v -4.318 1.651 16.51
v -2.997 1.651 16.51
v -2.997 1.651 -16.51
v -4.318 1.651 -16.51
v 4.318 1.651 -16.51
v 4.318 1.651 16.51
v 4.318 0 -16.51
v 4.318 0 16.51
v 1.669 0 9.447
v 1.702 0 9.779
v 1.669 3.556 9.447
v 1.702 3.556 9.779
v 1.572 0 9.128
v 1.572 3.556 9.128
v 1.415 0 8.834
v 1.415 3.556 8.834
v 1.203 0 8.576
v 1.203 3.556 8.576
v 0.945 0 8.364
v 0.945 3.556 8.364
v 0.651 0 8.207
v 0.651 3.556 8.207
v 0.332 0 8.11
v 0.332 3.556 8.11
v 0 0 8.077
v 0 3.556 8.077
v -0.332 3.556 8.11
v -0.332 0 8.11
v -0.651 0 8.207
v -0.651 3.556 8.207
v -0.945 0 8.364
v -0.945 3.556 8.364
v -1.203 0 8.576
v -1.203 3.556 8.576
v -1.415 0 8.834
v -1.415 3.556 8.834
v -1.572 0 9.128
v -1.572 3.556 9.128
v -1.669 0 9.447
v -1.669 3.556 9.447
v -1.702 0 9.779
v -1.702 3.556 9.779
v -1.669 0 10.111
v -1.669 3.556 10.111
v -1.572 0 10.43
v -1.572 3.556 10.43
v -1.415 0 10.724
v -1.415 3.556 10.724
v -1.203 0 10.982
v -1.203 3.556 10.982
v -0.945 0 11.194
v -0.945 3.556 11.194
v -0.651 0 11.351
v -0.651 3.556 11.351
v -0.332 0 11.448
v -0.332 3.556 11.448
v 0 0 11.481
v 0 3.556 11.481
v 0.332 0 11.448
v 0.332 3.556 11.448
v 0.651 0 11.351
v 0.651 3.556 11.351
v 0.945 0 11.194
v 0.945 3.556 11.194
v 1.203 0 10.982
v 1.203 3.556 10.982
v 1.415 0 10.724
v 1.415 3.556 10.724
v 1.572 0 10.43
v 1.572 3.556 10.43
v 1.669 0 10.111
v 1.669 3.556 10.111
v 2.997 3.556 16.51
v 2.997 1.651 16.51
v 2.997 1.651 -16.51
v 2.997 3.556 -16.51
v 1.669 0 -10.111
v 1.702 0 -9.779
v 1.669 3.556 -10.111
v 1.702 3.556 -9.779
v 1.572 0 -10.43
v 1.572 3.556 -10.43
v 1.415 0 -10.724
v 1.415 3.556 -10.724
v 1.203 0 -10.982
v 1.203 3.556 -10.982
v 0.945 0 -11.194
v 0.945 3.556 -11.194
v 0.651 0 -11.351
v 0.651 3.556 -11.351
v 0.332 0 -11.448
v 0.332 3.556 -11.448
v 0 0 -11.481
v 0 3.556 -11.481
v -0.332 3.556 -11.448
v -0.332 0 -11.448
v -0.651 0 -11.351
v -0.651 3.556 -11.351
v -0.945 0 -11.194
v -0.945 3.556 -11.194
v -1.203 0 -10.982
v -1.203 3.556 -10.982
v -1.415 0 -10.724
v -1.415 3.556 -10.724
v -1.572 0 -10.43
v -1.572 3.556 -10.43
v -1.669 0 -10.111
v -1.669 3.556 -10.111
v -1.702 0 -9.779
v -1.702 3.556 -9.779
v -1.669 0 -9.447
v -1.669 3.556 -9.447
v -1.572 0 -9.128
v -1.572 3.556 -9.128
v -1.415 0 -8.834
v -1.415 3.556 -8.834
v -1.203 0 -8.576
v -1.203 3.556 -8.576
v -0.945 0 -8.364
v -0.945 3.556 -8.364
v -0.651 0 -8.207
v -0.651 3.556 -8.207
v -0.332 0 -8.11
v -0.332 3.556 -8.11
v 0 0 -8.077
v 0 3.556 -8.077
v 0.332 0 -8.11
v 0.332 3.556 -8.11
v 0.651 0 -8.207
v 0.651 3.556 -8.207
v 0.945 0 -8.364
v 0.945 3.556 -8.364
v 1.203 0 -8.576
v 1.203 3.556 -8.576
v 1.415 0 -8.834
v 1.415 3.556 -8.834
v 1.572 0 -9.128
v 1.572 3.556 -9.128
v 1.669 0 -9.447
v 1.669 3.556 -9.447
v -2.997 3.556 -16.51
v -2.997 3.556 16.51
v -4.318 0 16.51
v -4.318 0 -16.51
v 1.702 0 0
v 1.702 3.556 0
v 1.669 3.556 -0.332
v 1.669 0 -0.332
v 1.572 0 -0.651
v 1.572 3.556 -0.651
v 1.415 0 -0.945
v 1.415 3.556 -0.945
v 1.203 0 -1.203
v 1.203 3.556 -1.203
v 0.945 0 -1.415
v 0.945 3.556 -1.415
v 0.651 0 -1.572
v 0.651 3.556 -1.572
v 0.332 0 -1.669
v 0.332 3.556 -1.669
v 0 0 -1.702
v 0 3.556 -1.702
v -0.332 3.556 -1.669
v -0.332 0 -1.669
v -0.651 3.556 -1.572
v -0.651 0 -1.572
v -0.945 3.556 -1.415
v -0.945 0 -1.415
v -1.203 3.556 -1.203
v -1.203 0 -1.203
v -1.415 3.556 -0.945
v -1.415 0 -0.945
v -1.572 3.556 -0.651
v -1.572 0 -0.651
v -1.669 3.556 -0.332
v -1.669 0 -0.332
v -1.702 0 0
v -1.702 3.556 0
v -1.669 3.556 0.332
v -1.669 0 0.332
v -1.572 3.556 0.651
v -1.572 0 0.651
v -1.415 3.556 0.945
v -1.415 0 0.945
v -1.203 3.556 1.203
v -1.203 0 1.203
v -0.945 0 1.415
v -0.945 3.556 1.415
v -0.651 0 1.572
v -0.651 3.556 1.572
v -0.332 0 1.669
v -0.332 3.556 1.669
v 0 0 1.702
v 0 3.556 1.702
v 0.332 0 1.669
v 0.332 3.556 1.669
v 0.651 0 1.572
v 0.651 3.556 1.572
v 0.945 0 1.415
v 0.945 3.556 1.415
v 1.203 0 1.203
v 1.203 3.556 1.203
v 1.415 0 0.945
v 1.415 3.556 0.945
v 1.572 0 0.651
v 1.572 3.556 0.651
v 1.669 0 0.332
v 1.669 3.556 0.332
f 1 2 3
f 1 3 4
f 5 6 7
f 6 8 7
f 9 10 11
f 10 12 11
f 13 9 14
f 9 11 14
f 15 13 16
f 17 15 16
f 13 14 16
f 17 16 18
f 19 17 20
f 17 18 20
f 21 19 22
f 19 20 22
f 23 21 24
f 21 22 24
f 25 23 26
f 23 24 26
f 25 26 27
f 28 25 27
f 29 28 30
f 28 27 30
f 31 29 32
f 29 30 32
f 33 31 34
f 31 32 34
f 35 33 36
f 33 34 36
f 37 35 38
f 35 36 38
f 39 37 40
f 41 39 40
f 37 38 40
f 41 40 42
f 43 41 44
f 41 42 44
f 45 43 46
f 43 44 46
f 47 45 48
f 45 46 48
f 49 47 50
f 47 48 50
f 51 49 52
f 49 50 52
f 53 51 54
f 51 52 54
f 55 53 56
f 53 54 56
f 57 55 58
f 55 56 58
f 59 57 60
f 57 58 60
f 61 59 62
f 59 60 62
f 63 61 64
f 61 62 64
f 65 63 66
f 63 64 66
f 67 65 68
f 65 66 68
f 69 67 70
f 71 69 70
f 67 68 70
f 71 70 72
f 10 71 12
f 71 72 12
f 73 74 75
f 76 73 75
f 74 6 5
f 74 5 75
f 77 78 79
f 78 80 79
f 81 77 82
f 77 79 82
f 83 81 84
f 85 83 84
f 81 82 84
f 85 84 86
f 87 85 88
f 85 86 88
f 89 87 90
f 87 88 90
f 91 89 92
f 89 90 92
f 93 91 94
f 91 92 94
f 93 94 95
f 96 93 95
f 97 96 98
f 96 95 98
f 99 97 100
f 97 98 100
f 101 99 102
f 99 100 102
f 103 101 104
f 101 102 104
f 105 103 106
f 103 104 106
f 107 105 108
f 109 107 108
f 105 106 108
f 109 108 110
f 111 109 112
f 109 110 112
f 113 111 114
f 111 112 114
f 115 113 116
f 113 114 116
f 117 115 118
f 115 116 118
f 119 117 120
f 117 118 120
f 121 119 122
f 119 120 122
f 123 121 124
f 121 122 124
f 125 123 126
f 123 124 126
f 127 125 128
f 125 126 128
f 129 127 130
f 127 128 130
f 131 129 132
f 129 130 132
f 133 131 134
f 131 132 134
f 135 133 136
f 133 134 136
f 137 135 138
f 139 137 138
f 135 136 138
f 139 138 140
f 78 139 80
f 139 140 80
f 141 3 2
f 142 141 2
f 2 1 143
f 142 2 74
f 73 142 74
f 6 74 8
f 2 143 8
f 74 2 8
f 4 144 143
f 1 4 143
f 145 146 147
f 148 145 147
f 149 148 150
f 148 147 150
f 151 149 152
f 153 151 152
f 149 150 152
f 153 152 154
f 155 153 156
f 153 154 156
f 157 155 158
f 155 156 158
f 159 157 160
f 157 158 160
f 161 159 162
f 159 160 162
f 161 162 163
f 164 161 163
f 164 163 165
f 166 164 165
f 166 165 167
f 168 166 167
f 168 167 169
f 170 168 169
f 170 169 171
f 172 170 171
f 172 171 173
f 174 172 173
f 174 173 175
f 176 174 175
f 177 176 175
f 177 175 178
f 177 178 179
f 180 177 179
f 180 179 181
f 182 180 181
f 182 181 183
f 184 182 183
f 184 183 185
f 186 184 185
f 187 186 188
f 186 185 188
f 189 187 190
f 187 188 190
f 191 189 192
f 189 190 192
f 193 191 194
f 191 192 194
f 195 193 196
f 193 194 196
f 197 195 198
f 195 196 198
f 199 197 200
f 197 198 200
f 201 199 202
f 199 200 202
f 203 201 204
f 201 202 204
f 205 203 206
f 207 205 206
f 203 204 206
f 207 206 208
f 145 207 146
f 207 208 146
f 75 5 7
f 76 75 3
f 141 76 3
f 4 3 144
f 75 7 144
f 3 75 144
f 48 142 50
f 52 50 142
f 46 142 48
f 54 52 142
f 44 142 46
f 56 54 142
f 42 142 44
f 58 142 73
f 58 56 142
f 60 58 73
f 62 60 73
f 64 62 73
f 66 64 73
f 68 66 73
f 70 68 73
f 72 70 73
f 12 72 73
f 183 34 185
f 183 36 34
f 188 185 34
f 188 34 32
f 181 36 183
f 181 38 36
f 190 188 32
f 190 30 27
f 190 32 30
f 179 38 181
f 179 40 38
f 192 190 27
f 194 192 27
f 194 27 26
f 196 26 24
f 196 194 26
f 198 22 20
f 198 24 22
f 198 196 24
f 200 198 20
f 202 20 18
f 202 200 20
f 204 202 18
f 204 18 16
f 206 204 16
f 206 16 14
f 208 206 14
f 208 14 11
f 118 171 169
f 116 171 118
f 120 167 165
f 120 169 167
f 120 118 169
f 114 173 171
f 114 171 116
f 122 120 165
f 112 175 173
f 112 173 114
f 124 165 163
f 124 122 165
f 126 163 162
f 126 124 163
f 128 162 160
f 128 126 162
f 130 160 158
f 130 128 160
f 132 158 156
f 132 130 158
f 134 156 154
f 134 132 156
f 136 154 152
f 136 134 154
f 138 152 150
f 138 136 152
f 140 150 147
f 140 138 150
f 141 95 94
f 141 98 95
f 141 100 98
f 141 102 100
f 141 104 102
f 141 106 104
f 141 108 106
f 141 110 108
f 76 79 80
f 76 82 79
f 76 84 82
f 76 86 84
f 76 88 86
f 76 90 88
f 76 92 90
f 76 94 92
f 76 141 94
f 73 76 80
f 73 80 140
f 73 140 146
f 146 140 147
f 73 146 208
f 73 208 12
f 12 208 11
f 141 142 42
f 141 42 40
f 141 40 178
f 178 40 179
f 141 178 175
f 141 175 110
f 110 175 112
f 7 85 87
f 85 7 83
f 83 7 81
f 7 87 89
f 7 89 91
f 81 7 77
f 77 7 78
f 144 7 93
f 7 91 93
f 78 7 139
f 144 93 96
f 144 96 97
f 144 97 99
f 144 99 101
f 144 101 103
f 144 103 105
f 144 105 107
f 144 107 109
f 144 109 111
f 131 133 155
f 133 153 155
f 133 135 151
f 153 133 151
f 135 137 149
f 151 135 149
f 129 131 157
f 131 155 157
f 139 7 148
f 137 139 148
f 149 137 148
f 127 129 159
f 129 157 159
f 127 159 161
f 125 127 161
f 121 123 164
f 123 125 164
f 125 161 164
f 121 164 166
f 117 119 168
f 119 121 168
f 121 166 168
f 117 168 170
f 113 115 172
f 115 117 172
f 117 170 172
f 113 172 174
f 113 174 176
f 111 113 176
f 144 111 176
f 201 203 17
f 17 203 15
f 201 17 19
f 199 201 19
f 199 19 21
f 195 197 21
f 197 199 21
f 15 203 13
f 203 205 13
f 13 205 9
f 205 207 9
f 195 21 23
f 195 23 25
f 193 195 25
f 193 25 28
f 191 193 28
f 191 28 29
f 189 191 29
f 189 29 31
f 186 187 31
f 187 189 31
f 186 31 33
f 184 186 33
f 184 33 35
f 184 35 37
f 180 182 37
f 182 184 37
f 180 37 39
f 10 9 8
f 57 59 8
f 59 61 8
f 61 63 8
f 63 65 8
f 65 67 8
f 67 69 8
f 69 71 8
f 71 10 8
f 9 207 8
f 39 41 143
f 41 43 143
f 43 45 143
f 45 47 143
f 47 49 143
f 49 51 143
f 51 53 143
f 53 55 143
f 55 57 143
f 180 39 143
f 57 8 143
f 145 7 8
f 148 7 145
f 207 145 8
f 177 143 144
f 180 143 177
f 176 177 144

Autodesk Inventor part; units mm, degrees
ref_plane "XZ Plane" through (0, 0, 0) normal (0, 1, 0) x (-1, 0, 0)
ref_plane "XY Plane" through (0, 0, 0) normal (0, 0, 1) x (1, 0, 0)
sketch "Sketch1" plane through (0, 0, 0) normal (0, 1, 0) x (-1, 0, 0)
  line L0 (4.318, 16.51) -> (-4.318, 16.51)
  line L1 (-4.318, 16.51) -> (-4.318, -16.51)
  line L2 (-4.318, -16.51) -> (4.318, -16.51)
  line L3 (4.318, -16.51) -> (4.318, 16.51)
  line L4 (4.318, 16.51) -> (-4.318, -16.51) construction
  line L5 (-4.318, 16.51) -> (4.318, -16.51) construction
  point P0 (0, 0)
  dimension "d0" = 8.636
  dimension "d1" = 33.02
extrude "Base" add sketch "Sketch1" along normal blind 1.651
sketch "Sketch2" plane through (0, 1.651, 0) normal (0, 1, 0) x (1, 0, 0)
  line L0 (-2.9972, -16.51) -> (2.9972, -16.51)
  line L1 (2.9972, -16.51) -> (2.9972, 16.51)
  line L2 (2.9972, 16.51) -> (-2.9972, 16.51)
  line L3 (-2.9972, 16.51) -> (-2.9972, -16.51)
  line L4 (-2.9972, -16.51) -> (2.9972, 16.51) construction
  line L5 (2.9972, -16.51) -> (-2.9972, 16.51) construction
  point P0 (0, 0)
  dimension "d4" = 5.9944
  dimension "d5" = 33.02
extrude "Step" add sketch "Sketch2" along normal blind 1.905
sketch "Sketch3" plane through (0, 3.556, 0) normal (0, 1, 0) x (1, 0, 0)
  circle A0 centre (0, 0) radius 1.7018
  circle A1 centre (0, -9.779) radius 1.7018
  circle A2 centre (0, 9.779) radius 1.7018
  dimension "d8" = 3.4036
  dimension "d9" = 3.4036
  dimension "d10" = 3.4036
  dimension "d11" = 9.779
  dimension "d12" = 9.779
extrude "Holes" cut sketch "Sketch3" against normal through all
equation "\"d11\" = d12"
properties part number "585757_plastic_770_holes"
